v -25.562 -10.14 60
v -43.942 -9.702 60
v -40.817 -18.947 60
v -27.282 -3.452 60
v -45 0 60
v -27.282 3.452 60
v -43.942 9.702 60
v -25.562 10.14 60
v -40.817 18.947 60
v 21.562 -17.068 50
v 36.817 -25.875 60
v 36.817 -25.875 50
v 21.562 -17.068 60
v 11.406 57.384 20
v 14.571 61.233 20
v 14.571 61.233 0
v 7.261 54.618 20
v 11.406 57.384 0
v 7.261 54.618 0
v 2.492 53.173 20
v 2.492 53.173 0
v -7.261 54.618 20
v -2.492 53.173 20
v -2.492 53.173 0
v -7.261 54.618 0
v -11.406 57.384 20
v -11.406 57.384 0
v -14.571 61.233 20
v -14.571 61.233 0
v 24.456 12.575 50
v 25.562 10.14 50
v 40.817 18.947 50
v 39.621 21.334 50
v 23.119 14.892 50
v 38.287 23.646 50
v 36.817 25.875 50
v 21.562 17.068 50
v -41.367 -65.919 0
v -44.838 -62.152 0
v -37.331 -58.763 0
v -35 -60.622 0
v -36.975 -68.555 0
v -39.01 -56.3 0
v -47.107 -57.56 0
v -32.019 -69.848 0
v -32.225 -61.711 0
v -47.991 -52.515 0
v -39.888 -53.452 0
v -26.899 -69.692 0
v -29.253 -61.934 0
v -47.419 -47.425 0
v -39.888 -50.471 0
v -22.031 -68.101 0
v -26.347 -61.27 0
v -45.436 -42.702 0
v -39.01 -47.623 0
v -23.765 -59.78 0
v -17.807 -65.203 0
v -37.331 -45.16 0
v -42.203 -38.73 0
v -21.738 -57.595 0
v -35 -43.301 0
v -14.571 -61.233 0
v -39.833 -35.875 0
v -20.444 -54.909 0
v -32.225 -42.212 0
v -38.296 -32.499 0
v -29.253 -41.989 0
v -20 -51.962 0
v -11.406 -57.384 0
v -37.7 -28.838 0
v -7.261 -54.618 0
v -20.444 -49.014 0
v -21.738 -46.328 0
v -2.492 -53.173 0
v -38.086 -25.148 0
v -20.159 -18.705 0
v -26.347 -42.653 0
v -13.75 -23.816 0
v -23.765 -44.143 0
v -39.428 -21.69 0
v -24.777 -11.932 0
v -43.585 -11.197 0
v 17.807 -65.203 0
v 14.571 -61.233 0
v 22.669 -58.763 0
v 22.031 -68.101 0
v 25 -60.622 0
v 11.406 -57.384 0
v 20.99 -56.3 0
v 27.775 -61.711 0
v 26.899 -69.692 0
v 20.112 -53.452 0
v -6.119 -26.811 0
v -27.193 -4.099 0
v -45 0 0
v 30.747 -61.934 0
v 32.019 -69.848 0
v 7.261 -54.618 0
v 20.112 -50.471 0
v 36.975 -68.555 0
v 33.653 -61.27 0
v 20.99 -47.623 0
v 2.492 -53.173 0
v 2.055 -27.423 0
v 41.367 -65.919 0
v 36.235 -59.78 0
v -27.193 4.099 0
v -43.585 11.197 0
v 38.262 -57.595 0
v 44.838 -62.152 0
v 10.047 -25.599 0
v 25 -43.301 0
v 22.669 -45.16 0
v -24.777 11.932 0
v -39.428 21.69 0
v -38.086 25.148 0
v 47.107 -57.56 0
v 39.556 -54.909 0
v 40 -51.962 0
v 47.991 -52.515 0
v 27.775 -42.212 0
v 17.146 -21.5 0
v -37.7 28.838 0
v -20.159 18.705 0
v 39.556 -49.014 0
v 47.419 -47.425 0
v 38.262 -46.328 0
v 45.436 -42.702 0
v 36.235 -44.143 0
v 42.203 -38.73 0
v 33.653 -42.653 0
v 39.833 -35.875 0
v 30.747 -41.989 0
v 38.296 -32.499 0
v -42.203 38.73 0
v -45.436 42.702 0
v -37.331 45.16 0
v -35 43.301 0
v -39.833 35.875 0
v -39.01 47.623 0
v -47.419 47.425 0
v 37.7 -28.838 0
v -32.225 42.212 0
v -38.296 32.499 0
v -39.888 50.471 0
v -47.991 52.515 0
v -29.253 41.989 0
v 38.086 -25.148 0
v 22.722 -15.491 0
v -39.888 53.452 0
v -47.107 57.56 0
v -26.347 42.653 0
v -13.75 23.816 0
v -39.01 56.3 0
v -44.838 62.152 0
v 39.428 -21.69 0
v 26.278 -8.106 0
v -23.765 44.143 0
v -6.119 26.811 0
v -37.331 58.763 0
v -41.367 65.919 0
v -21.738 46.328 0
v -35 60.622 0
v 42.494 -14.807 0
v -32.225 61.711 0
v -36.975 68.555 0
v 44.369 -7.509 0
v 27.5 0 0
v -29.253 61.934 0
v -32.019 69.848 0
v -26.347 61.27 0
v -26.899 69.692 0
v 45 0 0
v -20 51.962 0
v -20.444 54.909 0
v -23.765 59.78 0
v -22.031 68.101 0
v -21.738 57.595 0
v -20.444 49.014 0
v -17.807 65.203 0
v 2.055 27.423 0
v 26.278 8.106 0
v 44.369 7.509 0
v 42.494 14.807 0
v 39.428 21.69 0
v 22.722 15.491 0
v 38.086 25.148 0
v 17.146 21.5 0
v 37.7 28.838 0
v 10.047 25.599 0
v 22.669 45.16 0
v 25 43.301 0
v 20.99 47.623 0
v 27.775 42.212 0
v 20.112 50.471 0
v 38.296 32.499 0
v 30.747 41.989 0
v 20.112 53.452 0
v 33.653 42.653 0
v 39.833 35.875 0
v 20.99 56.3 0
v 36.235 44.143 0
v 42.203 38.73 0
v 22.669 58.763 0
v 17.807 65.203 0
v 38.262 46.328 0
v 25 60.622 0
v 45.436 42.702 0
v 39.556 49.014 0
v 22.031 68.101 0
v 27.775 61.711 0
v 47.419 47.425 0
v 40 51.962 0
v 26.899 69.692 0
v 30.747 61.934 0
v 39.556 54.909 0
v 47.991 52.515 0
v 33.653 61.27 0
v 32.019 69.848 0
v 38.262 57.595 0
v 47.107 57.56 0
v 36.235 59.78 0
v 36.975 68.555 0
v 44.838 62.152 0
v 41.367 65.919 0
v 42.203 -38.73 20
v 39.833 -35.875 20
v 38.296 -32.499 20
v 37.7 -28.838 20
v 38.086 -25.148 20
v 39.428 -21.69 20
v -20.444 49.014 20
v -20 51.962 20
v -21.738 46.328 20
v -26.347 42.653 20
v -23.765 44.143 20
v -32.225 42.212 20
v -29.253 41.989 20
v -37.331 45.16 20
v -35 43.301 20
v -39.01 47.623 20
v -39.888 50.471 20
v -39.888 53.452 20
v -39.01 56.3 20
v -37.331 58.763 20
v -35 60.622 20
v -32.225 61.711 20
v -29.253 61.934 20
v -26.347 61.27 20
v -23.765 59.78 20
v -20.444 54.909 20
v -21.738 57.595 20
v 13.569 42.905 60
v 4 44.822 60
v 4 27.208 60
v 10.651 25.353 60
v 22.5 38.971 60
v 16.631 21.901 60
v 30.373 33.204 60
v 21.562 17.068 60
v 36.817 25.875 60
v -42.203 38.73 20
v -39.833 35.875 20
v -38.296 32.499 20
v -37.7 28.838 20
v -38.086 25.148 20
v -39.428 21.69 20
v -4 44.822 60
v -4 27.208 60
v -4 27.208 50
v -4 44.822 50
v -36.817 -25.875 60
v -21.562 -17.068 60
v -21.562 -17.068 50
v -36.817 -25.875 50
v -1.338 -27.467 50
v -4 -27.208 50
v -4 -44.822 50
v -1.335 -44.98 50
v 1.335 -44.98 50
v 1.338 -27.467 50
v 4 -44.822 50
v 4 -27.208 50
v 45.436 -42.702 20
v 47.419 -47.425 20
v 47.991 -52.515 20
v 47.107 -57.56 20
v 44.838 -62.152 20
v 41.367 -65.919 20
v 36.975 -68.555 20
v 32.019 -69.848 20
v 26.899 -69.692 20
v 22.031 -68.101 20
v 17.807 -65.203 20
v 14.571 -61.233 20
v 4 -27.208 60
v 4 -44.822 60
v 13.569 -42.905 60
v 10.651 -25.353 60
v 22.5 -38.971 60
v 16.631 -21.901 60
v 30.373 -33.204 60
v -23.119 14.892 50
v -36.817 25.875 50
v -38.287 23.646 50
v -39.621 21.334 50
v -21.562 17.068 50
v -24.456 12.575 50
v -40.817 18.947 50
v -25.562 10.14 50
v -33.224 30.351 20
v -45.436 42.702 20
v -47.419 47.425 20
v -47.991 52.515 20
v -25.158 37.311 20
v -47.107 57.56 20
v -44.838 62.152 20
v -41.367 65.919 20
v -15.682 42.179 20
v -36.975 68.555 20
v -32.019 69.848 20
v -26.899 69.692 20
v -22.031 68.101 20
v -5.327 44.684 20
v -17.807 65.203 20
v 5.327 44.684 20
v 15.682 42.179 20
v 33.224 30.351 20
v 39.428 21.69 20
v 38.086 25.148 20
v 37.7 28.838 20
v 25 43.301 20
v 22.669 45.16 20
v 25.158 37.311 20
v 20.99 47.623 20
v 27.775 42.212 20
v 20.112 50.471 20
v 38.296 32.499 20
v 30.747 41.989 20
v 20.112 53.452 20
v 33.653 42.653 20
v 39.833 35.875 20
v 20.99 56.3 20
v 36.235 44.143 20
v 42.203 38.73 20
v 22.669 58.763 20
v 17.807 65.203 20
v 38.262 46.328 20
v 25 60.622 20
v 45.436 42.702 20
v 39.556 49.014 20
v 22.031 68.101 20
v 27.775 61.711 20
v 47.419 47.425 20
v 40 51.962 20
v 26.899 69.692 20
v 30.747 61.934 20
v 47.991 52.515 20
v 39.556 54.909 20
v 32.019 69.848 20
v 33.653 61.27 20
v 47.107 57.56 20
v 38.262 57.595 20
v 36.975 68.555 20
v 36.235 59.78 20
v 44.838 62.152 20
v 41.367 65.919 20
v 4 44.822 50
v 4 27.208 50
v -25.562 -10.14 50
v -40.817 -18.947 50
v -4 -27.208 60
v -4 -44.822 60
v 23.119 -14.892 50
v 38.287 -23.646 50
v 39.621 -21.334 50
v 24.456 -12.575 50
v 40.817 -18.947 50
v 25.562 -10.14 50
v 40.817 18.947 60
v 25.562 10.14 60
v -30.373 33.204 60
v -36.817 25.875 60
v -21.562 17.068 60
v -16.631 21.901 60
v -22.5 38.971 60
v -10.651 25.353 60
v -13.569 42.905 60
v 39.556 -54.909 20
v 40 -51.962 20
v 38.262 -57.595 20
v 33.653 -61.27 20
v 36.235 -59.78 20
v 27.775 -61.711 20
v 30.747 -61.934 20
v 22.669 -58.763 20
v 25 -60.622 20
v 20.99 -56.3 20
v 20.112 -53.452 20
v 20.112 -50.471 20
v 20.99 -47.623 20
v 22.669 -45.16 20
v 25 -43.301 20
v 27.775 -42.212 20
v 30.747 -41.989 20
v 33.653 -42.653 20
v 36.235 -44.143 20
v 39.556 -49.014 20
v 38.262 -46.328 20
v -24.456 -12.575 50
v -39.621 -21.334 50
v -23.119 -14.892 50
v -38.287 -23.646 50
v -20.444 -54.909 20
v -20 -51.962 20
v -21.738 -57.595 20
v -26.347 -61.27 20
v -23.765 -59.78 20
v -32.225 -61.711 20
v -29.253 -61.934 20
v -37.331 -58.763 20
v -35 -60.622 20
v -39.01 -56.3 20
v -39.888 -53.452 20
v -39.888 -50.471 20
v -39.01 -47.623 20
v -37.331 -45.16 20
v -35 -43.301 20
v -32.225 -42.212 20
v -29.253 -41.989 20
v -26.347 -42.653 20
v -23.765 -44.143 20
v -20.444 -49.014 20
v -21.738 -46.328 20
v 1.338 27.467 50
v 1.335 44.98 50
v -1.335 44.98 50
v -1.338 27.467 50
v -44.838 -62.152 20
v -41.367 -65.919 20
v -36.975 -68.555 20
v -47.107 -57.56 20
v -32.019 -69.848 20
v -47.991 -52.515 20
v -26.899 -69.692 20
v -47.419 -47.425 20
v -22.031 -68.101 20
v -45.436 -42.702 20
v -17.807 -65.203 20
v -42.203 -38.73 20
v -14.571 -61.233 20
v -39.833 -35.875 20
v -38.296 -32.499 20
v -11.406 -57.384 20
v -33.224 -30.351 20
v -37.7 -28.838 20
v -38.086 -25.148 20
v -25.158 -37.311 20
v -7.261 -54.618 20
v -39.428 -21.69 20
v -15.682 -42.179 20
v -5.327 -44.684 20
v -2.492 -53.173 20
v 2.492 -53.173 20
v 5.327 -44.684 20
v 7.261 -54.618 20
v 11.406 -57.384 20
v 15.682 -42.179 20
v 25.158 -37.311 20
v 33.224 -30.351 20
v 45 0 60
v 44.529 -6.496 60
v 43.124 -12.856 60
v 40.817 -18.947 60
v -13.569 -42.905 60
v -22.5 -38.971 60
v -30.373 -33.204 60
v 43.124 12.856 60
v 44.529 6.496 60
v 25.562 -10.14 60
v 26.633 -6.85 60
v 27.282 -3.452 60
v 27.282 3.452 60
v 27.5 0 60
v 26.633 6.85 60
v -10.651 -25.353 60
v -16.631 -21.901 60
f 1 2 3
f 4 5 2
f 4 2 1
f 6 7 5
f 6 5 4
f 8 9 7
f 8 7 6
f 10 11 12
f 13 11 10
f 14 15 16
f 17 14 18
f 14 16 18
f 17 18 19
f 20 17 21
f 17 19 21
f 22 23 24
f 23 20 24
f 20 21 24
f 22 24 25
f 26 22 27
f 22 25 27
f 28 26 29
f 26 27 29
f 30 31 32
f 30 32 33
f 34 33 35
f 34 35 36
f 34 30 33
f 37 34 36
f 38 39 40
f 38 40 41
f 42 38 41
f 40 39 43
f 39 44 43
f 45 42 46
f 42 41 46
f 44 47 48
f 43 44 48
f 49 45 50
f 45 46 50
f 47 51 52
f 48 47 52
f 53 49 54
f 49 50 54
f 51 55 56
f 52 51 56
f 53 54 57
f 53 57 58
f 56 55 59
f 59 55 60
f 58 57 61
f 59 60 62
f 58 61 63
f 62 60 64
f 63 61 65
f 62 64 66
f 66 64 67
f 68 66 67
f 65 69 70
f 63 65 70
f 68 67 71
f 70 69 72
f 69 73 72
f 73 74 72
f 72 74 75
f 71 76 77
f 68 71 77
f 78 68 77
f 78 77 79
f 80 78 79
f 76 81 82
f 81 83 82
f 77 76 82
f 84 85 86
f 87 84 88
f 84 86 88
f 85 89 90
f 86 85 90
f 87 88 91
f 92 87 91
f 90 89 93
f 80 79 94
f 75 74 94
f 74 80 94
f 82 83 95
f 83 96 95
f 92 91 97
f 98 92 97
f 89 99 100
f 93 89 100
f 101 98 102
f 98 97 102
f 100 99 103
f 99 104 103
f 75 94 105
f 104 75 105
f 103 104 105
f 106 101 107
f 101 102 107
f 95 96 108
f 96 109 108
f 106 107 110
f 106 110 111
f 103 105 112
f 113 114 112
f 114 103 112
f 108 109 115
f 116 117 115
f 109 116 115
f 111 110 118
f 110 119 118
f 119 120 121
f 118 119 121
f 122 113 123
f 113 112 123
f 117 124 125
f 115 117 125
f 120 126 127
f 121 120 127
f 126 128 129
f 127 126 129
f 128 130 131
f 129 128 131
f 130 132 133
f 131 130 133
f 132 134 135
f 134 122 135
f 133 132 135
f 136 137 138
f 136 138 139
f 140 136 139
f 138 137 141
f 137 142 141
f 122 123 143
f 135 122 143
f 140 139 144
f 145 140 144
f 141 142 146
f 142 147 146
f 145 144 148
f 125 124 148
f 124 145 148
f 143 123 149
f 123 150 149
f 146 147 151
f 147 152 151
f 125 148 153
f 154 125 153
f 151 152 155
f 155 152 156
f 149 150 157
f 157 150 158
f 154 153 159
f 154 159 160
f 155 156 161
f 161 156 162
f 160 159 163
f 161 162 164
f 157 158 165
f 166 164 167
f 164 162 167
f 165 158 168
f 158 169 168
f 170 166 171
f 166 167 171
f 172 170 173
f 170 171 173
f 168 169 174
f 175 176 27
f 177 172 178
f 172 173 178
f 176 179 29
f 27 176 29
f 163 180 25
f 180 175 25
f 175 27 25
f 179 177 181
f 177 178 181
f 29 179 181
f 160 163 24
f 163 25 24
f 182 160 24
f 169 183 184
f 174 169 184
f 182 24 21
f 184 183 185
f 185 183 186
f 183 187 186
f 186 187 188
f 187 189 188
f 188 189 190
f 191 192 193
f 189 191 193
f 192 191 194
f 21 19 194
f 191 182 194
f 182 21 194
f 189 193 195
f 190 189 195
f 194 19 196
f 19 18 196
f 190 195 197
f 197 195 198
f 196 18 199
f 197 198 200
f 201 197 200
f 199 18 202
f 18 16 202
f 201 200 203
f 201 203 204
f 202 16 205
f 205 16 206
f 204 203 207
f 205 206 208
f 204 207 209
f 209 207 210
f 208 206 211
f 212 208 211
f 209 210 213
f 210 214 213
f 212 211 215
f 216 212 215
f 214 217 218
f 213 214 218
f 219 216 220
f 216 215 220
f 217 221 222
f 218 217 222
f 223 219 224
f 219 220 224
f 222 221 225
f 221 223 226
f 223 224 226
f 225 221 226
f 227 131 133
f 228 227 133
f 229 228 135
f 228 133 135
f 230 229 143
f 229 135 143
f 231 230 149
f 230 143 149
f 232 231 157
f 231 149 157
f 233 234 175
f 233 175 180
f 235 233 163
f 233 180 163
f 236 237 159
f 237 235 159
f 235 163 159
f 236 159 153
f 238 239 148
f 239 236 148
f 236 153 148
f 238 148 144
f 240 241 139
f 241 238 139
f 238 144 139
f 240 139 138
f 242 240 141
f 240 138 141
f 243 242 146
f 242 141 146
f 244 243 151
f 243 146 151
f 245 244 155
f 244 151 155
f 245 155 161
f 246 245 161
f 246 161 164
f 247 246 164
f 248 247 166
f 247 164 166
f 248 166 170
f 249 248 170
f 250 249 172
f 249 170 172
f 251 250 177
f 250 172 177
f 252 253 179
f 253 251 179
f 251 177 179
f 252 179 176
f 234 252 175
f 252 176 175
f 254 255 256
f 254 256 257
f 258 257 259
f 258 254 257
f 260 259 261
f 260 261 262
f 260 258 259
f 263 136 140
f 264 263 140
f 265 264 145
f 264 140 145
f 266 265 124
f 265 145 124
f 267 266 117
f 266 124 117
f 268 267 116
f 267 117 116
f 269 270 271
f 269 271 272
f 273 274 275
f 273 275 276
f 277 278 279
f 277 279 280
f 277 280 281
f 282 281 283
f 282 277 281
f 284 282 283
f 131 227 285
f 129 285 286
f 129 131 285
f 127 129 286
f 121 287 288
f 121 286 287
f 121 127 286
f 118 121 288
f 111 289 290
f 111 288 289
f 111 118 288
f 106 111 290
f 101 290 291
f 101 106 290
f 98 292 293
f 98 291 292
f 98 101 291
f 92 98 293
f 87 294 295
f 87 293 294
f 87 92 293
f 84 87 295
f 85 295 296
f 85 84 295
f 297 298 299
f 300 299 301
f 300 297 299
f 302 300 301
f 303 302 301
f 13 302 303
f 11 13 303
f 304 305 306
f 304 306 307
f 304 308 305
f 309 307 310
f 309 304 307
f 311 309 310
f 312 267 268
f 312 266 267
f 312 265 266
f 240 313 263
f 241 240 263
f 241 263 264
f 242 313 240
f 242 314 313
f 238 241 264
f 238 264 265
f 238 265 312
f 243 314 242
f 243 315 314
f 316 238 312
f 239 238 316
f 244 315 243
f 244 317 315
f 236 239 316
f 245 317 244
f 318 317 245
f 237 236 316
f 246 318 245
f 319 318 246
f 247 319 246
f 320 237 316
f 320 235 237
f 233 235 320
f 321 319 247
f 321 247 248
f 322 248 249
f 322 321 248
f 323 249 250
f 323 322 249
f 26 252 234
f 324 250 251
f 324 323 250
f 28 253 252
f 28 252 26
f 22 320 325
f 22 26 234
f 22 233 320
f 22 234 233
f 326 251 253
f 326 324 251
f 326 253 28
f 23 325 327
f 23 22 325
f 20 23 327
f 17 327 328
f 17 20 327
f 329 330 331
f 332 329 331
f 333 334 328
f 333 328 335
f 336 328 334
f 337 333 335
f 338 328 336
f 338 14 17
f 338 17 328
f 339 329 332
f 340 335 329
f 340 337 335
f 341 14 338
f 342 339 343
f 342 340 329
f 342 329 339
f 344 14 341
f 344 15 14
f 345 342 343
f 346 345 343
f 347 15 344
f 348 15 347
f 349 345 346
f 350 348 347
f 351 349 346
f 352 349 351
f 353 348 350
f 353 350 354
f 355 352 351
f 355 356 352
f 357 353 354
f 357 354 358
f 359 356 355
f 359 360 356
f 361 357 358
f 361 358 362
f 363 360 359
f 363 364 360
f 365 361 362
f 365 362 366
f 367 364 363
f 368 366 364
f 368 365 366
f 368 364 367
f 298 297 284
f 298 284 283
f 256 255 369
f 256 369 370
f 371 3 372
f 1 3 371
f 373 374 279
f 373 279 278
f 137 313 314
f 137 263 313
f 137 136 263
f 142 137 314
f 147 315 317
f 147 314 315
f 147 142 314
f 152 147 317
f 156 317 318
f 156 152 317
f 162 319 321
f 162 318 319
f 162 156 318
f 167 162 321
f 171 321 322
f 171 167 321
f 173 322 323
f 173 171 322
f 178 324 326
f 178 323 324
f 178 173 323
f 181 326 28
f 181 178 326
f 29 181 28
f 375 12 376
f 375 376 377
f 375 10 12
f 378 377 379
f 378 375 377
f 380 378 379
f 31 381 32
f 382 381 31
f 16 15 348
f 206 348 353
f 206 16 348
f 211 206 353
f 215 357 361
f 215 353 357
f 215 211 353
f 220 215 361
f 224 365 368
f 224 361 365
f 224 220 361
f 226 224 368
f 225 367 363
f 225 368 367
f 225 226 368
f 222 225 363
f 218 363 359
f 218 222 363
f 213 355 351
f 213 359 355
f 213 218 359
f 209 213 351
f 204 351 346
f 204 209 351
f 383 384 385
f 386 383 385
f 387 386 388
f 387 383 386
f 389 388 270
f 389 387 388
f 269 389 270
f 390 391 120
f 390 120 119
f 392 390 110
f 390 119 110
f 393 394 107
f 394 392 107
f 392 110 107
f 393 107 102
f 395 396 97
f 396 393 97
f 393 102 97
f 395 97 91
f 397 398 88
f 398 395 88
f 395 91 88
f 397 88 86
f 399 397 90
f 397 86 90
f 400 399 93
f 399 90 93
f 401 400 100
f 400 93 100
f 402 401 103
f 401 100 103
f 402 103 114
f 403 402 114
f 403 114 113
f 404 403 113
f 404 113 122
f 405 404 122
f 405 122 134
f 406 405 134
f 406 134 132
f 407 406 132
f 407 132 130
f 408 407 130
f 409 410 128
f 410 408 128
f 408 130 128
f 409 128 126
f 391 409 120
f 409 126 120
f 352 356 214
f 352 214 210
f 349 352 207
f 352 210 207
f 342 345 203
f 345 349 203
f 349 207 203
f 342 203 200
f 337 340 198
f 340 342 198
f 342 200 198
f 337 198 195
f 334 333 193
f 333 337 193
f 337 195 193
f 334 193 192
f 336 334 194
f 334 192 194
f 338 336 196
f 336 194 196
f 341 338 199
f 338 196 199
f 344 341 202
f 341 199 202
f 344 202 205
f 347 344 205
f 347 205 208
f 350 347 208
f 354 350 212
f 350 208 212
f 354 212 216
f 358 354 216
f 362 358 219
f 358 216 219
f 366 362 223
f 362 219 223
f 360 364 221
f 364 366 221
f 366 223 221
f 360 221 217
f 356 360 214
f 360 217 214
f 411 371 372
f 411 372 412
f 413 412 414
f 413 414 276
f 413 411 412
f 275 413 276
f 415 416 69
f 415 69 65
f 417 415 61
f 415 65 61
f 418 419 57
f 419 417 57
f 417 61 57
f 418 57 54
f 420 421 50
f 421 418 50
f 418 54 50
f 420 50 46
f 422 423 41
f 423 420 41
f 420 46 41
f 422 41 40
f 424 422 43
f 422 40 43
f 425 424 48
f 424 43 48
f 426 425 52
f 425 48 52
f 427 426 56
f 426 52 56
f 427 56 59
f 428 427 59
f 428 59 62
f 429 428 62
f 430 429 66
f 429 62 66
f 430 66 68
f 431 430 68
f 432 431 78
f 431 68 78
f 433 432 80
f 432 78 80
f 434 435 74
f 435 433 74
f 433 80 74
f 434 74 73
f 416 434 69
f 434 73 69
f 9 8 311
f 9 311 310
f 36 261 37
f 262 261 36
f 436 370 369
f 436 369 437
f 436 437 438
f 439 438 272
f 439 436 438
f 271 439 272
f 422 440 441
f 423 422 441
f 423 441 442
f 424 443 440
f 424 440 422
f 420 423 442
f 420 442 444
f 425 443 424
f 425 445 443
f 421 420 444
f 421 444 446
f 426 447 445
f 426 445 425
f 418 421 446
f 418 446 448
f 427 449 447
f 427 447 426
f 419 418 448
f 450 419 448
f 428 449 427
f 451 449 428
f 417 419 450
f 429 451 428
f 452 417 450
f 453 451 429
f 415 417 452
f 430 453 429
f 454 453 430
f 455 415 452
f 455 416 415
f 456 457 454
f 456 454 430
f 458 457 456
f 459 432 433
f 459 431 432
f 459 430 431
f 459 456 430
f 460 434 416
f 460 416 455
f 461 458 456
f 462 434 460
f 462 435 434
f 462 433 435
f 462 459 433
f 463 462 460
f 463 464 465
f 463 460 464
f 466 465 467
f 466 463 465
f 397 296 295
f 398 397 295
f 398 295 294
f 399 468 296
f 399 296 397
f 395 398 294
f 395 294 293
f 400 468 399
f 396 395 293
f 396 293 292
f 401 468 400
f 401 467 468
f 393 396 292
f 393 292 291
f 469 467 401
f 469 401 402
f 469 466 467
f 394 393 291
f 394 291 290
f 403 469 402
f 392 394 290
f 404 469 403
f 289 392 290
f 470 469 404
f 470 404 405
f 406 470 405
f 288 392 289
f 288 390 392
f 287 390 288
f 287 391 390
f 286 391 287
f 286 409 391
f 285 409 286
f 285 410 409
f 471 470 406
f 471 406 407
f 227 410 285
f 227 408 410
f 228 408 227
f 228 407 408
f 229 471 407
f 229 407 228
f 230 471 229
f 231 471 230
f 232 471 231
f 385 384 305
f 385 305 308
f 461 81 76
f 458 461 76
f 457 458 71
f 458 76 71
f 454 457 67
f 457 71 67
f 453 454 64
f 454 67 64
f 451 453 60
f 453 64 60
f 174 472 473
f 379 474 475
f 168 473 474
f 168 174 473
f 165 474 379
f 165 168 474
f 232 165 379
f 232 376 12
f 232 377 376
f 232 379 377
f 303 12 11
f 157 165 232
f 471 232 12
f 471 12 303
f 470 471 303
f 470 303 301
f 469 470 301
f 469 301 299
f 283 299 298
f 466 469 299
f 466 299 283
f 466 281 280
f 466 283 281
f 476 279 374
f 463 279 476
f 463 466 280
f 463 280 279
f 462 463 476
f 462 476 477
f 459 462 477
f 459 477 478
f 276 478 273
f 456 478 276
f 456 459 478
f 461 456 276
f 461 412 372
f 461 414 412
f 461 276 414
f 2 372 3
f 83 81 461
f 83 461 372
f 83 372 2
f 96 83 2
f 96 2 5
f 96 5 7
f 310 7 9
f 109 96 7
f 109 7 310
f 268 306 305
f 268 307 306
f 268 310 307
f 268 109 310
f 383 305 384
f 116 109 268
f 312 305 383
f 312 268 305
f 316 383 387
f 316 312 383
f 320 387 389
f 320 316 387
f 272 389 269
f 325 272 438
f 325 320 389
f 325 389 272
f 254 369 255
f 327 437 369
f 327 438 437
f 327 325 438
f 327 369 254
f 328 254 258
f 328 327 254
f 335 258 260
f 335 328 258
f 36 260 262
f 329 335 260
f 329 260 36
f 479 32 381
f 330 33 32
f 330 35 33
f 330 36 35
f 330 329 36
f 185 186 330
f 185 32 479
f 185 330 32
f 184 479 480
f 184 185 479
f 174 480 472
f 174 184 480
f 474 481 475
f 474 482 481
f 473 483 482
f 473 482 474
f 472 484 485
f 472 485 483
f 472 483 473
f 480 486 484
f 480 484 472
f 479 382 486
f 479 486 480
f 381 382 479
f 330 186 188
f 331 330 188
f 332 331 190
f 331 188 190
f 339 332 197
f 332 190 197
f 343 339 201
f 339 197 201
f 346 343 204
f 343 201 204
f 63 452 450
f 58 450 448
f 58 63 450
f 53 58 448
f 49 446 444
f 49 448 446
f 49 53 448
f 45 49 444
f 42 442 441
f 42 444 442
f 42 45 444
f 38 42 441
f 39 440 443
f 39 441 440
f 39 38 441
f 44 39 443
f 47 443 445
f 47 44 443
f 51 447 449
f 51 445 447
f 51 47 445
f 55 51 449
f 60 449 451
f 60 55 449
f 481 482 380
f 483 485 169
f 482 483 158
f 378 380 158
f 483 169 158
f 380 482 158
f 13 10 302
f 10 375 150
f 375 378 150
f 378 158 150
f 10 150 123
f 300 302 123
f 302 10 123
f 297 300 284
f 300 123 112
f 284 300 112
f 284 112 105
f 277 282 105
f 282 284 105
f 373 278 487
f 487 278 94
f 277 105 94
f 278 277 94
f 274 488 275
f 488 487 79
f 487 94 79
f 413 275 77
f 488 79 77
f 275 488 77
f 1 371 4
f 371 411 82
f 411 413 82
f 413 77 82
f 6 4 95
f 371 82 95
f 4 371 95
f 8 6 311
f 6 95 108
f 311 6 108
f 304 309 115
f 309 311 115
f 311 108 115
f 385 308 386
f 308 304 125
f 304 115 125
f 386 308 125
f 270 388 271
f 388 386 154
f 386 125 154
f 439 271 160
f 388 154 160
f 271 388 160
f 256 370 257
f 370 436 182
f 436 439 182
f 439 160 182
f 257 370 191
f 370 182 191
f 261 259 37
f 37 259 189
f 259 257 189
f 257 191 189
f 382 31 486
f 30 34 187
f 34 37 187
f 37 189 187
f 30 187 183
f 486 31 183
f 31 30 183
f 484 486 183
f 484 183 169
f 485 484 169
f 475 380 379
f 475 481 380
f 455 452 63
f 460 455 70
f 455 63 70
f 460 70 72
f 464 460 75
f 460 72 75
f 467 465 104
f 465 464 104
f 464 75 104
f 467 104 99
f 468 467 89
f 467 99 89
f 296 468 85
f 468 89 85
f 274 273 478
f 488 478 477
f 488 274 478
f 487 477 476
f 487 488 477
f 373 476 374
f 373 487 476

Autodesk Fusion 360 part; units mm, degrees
sketch "Sketch1" plane through (0, 0, 0) normal (0, 0, 1) x (1, 0, 0)
  circle A0 centre (0, 0) radius 27.5
  circle A1 centre (0, 0) radius 45
  line L0 (0, 0) -> (0, 76.7772) construction
  line L1 (0, 0) -> (75, 0) construction
  circle A2 centre (-30, 51.9615) radius 10
  circle A3 centre (30, 51.9615) radius 10
  arc A4 (-14.5714, 61.2329) -> (14.5714, 61.2329) centre (0, 69.9893) ccw
  arc A5 (-39.4278, 21.6899) -> (-42.203, 38.7295) centre (-51.6942, 28.4379) ccw
  arc A6 (42.203, 38.7295) -> (39.4278, 21.6899) centre (51.6942, 28.4379) ccw
  arc A7 (42.203, 38.7295) -> (14.5714, 61.2329) centre (30, 51.9615) ccw
  arc A8 (-14.5714, 61.2329) -> (-42.203, 38.7295) centre (-30, 51.9615) ccw
  line L2 (0, 0) -> (-13.75, 23.8157) construction
  line L3 (-21, 36.3731) -> (-39.3324, 68.1256) construction
  arc A9 (-42.203, -38.7295) -> (-39.4278, -21.6899) centre (-51.6942, -28.4379) ccw
  arc A10 (-42.203, -38.7295) -> (-14.5714, -61.2329) centre (-30, -51.9615) ccw
  arc A11 (14.5714, -61.2329) -> (42.203, -38.7295) centre (30, -51.9615) ccw
  arc A12 (39.4278, -21.6899) -> (42.203, -38.7295) centre (51.6942, -28.4379) ccw
  arc A13 (14.5714, -61.2329) -> (-14.5714, -61.2329) centre (0, -69.9893) ccw
  circle A14 centre (30, -51.9615) radius 10
  circle A15 centre (-30, -51.9615) radius 10
  dimension "d1" = 55
  dimension "d2" = 90
  dimension "d3" = 30
  dimension "d4" = 20
  dimension "d5" = 36
  dimension "d6" = 60
  dimension "d7" = 17
  dimension "d8" = 14
extrude "Extrude1" add sketch "Sketch1" along normal blind 20 contours A1 A4 A5 A6 A7 A8 | A1 A9 A10 A11 A12 A13 makes body 1 at (-33.2239, 30.3508, 13.3333) makes body 2 at (37.1945, -25.3292, 13.3333)
extrude "Extrude2" add sketch "Sketch1" along normal blind 60 contours A1 bodies 1 2
sketch "Sketch2" plane through (0, 0, 60) normal (0, 0, 1) x (-1, 0, 0)
  circle A0 centre (0, 0) radius 27.5
  circle A1 centre (0, 0) radius 45
  line L0 (-4, -22.5) -> (4, -22.5)
  line L1 (4, -22.5) -> (4, -47.5)
  line L2 (4, -47.5) -> (-4, -47.5)
  line L3 (-4, -47.5) -> (-4, -22.5)
  line L4 (-4, -22.5) -> (4, -47.5) construction
  line L5 (4, -22.5) -> (-4, -47.5) construction
  point P0 (0, -35)
  dimension "d13" = 8
  dimension "d14" = 25
extrude "Extrude3" cut sketch "Sketch2" against normal blind 10 contours A0 A1 L1 L3 picked at (-3.1125, -33.1656) bodies 1
pattern_circular "C-Pattern1" count 6 over 360 about axis through (0, 0, 60) along (0, 0, 1) of "Extrude3"
